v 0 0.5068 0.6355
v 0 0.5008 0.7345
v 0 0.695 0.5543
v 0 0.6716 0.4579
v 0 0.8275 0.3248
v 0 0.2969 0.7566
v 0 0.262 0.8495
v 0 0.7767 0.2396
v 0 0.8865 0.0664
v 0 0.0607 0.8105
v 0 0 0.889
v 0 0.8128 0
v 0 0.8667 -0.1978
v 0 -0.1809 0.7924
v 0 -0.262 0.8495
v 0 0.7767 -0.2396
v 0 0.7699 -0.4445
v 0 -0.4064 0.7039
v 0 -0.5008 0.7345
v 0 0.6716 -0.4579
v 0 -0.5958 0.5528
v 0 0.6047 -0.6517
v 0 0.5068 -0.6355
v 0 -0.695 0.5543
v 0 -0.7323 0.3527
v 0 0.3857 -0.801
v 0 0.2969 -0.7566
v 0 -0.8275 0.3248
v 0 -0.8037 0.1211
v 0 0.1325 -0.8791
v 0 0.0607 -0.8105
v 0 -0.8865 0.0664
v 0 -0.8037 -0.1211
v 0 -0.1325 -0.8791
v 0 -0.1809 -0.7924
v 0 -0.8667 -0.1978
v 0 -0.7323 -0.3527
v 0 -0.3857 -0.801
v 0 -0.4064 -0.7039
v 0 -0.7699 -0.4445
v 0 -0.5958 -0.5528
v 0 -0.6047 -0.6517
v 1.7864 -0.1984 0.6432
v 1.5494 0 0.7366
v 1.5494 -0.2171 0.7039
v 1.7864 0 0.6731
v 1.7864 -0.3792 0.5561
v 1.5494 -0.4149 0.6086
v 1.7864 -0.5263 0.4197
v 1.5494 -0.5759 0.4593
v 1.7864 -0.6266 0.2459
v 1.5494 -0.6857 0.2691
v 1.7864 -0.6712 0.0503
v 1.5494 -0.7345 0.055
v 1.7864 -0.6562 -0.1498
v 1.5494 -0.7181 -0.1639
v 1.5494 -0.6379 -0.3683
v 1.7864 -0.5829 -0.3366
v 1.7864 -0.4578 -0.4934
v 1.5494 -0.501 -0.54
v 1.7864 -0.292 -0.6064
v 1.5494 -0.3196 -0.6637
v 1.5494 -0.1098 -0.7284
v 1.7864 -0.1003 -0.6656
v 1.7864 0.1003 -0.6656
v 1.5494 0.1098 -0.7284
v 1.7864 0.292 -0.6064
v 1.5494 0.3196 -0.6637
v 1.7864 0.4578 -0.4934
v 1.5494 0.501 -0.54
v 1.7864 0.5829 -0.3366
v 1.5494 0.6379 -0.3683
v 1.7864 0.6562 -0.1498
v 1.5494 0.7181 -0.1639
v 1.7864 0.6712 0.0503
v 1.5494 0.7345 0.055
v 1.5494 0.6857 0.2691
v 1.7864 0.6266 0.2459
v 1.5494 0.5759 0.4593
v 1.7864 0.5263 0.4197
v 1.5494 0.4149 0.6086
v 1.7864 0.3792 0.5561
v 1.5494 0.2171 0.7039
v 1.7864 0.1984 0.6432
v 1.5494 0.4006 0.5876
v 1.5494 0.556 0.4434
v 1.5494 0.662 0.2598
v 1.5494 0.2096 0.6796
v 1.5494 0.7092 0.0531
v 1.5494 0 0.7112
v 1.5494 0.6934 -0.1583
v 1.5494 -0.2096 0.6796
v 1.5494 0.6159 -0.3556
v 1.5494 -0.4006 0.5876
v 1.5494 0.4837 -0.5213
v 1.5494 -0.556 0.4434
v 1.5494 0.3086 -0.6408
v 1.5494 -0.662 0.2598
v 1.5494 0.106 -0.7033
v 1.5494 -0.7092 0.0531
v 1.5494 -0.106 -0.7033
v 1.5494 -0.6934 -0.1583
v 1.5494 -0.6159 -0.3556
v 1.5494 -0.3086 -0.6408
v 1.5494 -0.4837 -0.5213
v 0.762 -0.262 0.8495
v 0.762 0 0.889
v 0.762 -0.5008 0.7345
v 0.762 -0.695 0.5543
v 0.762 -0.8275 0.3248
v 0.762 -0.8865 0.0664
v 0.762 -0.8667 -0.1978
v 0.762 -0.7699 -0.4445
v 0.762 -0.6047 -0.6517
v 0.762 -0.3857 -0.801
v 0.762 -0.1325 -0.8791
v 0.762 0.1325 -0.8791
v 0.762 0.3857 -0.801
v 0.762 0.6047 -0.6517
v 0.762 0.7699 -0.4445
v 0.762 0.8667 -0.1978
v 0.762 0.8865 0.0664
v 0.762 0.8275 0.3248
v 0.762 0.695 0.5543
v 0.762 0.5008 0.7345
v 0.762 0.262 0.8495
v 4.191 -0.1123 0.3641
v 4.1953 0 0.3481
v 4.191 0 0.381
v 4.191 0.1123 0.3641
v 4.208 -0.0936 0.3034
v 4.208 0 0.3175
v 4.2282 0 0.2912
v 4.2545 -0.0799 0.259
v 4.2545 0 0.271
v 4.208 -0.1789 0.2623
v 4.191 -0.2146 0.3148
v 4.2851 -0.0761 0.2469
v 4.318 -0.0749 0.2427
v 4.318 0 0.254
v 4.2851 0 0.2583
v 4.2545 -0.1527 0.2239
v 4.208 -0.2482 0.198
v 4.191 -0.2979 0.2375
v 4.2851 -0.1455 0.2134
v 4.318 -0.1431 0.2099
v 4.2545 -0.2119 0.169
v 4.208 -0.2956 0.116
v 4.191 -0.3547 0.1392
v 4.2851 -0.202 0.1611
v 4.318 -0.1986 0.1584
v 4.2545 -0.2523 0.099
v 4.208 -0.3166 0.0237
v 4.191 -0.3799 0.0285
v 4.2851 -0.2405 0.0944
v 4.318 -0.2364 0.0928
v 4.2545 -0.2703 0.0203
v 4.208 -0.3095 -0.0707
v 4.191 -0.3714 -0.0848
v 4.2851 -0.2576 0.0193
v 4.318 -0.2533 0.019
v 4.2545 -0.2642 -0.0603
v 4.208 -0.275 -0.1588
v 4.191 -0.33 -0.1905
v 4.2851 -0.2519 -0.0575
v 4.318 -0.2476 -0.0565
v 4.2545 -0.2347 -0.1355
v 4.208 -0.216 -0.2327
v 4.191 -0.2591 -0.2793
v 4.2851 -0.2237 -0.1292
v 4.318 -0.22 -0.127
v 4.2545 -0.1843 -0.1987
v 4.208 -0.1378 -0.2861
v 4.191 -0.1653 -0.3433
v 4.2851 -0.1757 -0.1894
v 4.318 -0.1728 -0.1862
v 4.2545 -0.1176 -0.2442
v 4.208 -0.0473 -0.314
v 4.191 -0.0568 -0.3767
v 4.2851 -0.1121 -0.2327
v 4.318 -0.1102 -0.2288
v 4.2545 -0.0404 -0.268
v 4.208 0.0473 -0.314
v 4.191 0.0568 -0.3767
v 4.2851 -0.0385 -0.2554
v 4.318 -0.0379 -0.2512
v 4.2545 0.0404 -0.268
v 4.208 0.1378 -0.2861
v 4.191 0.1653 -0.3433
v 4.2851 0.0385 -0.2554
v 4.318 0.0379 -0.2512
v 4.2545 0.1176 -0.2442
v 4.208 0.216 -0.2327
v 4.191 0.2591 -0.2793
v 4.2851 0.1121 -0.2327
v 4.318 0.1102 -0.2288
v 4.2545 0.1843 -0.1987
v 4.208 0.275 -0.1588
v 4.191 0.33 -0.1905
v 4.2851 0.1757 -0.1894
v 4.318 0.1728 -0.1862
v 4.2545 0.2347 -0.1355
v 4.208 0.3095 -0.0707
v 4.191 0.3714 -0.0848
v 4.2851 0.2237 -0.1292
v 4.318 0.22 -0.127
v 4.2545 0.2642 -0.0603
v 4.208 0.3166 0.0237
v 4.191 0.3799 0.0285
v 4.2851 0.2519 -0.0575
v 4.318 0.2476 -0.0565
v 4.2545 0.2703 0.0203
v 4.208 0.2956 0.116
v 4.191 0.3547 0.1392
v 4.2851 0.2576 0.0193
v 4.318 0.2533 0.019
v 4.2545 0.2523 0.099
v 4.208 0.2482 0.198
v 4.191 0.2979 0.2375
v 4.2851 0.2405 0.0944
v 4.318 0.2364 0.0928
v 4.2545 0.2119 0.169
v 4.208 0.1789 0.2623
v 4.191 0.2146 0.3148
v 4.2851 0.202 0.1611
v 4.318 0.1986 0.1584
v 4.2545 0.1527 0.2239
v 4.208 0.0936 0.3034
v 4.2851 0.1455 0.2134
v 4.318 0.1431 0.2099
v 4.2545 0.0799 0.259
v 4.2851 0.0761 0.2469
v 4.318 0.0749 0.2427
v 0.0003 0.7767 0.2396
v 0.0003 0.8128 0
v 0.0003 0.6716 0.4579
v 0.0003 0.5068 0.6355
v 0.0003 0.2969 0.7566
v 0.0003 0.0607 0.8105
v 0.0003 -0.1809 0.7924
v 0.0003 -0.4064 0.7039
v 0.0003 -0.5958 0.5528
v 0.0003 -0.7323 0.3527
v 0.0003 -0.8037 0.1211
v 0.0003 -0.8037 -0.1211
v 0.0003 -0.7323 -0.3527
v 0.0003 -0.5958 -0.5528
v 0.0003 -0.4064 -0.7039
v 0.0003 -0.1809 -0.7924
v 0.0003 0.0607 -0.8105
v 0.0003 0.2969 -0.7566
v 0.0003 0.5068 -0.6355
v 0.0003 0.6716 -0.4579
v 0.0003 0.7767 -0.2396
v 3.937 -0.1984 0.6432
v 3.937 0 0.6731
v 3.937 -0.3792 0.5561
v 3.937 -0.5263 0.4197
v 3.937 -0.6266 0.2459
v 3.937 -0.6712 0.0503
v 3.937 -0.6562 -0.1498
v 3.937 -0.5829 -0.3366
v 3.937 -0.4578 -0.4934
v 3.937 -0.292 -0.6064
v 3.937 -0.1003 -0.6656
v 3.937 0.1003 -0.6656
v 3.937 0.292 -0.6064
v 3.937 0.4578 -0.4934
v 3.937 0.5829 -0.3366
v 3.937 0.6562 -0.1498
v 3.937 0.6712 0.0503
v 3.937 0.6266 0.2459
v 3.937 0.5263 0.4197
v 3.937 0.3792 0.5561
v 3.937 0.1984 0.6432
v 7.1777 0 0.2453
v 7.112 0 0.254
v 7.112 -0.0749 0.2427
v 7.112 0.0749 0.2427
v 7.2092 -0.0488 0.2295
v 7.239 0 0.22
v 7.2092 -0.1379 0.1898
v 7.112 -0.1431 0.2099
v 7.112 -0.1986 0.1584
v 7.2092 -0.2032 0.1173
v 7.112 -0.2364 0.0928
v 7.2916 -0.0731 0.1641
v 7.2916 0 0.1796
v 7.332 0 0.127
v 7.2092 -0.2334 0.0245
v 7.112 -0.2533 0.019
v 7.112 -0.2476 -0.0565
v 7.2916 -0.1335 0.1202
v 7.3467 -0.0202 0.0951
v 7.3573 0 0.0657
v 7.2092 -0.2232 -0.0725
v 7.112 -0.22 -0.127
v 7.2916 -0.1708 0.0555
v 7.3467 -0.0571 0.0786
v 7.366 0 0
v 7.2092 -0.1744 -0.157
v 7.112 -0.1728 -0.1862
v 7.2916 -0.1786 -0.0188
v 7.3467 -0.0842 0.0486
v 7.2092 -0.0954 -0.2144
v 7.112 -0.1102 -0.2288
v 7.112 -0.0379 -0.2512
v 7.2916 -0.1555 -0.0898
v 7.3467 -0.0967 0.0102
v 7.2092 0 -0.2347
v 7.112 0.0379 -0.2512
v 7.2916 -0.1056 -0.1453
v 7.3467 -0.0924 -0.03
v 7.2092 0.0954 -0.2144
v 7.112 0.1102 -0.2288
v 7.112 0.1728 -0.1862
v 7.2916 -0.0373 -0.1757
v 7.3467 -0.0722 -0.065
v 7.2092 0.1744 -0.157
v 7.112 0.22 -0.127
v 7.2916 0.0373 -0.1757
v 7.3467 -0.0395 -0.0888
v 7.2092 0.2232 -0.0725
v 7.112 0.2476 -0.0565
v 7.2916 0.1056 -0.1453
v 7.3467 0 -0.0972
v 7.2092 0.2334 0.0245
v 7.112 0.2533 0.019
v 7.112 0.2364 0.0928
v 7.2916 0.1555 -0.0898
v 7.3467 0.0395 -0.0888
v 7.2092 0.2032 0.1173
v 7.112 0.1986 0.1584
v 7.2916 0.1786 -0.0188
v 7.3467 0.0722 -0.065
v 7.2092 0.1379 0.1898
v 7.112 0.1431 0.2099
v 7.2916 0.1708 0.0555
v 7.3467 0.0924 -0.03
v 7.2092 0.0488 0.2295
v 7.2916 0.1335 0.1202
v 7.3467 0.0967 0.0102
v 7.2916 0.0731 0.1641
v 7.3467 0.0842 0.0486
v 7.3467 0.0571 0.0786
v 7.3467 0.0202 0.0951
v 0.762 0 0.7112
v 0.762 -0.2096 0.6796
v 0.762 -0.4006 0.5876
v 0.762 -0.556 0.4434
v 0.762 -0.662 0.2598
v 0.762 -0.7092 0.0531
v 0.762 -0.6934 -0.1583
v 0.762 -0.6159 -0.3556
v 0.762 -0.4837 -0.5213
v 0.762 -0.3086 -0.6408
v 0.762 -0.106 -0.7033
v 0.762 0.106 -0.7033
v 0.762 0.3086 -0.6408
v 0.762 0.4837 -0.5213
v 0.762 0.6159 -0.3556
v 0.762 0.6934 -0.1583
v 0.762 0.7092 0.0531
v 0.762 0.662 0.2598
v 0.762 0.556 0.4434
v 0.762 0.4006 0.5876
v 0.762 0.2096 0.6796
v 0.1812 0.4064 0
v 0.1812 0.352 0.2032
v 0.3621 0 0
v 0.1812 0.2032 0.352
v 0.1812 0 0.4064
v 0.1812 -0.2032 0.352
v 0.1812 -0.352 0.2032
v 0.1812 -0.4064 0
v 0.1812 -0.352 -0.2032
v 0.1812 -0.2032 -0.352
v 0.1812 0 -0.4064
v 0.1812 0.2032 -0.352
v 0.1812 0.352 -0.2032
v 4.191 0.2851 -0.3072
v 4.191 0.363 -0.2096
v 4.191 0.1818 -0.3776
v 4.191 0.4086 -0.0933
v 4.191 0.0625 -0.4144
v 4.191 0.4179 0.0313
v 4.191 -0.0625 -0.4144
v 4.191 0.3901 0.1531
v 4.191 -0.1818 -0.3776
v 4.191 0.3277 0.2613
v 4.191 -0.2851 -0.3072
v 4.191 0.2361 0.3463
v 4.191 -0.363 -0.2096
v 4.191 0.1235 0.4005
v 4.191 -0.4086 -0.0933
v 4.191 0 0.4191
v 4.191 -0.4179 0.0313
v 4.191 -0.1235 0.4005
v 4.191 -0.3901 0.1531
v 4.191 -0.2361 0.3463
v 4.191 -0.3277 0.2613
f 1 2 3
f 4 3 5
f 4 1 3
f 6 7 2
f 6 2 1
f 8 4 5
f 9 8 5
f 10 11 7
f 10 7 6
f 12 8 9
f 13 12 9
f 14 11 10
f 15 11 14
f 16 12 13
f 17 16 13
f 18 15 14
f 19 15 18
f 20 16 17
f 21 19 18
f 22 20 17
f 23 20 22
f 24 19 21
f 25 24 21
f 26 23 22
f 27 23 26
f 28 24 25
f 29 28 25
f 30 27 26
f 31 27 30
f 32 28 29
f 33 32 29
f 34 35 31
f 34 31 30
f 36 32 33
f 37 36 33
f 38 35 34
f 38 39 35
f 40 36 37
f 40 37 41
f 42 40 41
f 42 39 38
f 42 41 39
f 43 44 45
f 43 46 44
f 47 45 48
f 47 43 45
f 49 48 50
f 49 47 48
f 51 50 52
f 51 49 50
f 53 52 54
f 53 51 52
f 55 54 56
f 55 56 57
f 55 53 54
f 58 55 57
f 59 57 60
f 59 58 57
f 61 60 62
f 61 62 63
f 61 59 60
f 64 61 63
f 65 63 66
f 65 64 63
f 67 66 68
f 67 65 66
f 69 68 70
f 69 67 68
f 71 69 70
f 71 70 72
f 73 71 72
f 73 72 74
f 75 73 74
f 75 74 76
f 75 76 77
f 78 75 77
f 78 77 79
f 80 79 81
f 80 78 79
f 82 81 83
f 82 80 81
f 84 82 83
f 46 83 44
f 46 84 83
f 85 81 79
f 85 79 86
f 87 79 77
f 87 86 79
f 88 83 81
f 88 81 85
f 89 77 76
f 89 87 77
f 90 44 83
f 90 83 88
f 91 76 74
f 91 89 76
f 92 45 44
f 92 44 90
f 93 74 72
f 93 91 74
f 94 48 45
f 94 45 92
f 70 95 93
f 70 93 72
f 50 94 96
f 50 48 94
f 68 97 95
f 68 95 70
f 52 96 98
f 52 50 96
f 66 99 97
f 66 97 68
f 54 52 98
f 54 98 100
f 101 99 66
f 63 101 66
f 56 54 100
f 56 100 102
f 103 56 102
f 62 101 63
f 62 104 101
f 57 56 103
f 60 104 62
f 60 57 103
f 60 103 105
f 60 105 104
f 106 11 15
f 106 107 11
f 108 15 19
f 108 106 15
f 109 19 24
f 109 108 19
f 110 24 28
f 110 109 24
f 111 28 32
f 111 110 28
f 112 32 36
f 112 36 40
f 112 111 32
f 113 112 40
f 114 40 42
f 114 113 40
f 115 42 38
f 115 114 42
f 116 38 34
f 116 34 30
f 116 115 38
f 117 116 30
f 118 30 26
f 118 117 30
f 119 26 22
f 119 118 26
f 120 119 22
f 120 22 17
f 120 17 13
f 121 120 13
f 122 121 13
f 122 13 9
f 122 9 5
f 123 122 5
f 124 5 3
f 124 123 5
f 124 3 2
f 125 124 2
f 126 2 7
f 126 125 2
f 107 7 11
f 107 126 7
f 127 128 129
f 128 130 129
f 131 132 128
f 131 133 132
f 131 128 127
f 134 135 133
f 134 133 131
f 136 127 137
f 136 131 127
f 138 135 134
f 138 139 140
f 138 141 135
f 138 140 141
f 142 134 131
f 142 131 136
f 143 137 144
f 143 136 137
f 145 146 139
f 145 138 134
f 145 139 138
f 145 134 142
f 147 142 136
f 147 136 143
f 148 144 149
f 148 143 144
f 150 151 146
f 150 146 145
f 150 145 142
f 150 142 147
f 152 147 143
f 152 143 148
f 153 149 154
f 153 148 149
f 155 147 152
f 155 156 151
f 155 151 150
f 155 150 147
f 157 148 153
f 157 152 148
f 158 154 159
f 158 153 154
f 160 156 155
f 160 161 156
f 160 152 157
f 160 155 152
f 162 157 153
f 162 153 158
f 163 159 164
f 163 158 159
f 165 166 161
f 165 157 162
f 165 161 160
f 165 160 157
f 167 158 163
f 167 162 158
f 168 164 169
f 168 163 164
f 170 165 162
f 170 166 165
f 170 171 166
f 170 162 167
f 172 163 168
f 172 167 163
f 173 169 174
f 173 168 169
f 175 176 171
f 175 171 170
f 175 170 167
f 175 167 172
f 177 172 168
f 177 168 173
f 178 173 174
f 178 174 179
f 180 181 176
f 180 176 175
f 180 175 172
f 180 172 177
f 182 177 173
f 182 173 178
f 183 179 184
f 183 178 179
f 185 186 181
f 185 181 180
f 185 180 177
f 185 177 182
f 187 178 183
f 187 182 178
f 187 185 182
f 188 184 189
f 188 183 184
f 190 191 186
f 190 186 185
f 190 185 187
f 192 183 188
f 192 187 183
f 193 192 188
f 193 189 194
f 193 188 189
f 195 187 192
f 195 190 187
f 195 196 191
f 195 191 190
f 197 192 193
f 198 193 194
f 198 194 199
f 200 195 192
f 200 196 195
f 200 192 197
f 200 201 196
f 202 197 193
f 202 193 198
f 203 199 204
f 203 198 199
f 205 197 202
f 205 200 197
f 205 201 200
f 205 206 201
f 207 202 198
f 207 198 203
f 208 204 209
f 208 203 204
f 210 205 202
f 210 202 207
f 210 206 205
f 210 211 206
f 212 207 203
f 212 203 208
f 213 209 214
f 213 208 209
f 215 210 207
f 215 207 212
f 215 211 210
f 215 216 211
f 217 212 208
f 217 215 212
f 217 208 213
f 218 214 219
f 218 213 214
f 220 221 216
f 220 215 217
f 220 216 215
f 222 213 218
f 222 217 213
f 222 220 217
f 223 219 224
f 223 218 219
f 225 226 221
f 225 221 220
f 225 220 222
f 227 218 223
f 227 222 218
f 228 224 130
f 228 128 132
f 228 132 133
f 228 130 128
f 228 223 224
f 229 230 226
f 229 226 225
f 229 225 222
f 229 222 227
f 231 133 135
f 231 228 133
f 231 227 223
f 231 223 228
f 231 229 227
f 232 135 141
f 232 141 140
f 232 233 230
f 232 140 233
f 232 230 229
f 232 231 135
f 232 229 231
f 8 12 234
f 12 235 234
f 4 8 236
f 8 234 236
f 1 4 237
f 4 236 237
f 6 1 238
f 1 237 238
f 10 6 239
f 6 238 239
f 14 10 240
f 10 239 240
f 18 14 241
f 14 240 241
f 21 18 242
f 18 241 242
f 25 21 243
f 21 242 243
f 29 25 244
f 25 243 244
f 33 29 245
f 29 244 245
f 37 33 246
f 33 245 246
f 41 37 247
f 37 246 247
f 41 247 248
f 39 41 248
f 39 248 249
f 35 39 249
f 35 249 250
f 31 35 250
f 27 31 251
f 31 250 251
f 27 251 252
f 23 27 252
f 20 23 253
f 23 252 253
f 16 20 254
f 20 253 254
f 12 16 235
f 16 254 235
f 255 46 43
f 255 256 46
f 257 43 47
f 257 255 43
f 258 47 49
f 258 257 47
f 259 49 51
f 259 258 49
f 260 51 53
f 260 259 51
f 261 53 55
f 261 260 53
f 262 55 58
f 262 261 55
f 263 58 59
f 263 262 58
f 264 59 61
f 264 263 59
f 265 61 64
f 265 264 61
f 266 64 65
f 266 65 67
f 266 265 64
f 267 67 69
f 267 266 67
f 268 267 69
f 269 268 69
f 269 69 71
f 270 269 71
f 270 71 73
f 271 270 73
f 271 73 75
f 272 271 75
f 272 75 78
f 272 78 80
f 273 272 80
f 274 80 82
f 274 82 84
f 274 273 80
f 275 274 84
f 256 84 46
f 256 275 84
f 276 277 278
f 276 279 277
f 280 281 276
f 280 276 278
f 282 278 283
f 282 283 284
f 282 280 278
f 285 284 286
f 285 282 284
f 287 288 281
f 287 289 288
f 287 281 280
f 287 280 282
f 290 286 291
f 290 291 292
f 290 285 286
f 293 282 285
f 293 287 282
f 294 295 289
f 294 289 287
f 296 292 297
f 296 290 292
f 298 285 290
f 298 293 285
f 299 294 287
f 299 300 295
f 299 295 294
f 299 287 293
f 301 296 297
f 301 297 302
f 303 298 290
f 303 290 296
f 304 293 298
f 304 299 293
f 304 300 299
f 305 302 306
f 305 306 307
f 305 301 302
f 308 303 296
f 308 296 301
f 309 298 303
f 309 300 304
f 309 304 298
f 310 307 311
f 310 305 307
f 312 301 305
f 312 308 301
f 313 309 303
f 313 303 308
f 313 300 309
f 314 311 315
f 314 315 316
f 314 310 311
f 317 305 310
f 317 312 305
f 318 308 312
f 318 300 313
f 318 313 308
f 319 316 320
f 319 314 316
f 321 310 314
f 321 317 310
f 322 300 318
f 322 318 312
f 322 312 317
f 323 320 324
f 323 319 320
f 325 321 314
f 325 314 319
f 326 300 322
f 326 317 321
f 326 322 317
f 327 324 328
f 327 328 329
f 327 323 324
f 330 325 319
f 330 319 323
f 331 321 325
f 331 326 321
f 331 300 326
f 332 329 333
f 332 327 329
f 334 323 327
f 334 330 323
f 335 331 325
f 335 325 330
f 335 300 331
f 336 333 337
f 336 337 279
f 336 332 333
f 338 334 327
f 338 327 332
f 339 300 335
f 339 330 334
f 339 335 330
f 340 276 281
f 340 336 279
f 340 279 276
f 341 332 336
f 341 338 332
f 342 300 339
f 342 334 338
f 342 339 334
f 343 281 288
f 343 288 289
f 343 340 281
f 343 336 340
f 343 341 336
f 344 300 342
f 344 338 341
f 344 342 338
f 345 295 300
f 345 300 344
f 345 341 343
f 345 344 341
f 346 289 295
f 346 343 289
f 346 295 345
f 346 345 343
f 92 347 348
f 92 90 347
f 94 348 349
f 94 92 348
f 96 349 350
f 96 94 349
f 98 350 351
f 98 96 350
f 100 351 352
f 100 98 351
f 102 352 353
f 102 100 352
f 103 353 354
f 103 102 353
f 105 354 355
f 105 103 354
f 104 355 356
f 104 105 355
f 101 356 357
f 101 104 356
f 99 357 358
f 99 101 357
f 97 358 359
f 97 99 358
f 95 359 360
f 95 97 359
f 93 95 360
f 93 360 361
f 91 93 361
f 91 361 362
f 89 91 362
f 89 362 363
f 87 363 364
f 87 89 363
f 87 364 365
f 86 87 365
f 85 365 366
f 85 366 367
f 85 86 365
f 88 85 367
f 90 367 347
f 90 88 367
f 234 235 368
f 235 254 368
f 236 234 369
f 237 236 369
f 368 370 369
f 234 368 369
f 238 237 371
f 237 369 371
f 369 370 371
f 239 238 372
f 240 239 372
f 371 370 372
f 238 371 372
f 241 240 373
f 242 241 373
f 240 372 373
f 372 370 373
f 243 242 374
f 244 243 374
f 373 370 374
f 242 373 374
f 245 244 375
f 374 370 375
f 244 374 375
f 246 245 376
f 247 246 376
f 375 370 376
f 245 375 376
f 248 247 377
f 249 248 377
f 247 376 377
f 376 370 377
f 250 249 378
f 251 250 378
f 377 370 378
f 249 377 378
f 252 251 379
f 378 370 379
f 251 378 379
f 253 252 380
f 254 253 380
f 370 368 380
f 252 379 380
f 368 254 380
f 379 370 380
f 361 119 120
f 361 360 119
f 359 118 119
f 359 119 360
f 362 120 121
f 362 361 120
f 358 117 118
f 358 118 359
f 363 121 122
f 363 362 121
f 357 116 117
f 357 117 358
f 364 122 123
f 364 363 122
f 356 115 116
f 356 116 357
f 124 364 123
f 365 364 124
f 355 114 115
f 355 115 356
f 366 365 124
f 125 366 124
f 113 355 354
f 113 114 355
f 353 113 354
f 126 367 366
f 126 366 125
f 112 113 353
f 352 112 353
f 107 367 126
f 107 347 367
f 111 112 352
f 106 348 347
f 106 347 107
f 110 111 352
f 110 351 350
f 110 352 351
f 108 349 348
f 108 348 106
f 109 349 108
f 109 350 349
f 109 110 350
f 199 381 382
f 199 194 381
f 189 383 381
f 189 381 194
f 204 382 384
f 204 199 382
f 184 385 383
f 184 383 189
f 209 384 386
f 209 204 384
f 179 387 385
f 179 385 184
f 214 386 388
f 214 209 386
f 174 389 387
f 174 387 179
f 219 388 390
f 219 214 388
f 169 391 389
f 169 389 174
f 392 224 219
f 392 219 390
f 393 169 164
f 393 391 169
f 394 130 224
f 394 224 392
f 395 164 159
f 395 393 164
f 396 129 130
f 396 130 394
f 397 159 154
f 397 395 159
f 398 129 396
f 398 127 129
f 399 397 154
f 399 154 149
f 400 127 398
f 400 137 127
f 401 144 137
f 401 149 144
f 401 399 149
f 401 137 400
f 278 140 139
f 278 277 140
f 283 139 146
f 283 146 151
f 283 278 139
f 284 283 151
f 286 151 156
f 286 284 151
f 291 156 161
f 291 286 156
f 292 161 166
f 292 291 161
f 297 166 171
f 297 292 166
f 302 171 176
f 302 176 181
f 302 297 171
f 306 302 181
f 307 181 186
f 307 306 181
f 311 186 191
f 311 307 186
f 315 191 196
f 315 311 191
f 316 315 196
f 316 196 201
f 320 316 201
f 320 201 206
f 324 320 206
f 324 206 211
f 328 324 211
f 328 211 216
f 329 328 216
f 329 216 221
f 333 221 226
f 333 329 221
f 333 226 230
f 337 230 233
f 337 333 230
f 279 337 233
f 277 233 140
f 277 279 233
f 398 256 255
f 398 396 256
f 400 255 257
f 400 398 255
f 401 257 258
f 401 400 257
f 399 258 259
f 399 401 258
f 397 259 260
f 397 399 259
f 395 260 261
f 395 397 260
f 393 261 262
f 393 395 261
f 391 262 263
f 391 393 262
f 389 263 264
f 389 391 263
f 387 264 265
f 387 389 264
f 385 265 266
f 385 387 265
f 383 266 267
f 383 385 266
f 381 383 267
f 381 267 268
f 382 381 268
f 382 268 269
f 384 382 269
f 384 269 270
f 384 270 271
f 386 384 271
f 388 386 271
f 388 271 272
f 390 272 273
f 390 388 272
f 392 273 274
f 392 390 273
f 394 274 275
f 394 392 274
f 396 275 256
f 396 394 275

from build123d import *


# Read off the part's stored shape, not the designer's step: Hole1
with BuildPart() as part:
    # Sketch1 → RevolutionAngle1 (revolve)
    with BuildSketch(Plane.XY, mode=Mode.PRIVATE) as revolutionangle1_sk:
        with BuildLine():
            Line((4.191, 0.4191), (4.191, 0.381))
            ThreePointArc((4.191, 0.381), (4.228197439, 0.291197439), (4.318, 0.254))
            Line((4.318, 0.254), (7.112, 0.254))
            ThreePointArc((7.112, 0.254), (7.291605122, 0.179605122), (7.366, 0))
            Line((7.366, 0), (0, 0))
            Line((0, 0), (0, 0.889))
            Line((0, 0.889), (0.762, 0.889))
            Line((0.762, 0.889), (0.762, 0.7112))
            Line((0.762, 0.7112), (1.5494, 0.7112))
            Line((1.5494, 0.7112), (1.5494, 0.7366))
            Line((1.5494, 0.7366), (1.786385226, 0.6731))
            Line((1.786385226, 0.6731), (3.937, 0.6731))
            Line((3.937, 0.6731), (4.191, 0.4191))
        make_face()
    revolve(revolutionangle1_sk.sketch.rotate(Axis((0, 0, 0), (1, 0, 0)), 90), axis=Axis((0, 0, 0), (1, 0, 0)))

    # Hole1 outline → Hole1 (revolve, cut)
    with BuildSketch(Plane.YX):
        Polygon((0.8128, 0.000254), (0, 0.362135875), (0, 0), (0.8128, 0), align=None)
    revolve(axis=Axis((0, 0, 0), (1, 0, 0)), mode=Mode.SUBTRACT)


solid = part.part
